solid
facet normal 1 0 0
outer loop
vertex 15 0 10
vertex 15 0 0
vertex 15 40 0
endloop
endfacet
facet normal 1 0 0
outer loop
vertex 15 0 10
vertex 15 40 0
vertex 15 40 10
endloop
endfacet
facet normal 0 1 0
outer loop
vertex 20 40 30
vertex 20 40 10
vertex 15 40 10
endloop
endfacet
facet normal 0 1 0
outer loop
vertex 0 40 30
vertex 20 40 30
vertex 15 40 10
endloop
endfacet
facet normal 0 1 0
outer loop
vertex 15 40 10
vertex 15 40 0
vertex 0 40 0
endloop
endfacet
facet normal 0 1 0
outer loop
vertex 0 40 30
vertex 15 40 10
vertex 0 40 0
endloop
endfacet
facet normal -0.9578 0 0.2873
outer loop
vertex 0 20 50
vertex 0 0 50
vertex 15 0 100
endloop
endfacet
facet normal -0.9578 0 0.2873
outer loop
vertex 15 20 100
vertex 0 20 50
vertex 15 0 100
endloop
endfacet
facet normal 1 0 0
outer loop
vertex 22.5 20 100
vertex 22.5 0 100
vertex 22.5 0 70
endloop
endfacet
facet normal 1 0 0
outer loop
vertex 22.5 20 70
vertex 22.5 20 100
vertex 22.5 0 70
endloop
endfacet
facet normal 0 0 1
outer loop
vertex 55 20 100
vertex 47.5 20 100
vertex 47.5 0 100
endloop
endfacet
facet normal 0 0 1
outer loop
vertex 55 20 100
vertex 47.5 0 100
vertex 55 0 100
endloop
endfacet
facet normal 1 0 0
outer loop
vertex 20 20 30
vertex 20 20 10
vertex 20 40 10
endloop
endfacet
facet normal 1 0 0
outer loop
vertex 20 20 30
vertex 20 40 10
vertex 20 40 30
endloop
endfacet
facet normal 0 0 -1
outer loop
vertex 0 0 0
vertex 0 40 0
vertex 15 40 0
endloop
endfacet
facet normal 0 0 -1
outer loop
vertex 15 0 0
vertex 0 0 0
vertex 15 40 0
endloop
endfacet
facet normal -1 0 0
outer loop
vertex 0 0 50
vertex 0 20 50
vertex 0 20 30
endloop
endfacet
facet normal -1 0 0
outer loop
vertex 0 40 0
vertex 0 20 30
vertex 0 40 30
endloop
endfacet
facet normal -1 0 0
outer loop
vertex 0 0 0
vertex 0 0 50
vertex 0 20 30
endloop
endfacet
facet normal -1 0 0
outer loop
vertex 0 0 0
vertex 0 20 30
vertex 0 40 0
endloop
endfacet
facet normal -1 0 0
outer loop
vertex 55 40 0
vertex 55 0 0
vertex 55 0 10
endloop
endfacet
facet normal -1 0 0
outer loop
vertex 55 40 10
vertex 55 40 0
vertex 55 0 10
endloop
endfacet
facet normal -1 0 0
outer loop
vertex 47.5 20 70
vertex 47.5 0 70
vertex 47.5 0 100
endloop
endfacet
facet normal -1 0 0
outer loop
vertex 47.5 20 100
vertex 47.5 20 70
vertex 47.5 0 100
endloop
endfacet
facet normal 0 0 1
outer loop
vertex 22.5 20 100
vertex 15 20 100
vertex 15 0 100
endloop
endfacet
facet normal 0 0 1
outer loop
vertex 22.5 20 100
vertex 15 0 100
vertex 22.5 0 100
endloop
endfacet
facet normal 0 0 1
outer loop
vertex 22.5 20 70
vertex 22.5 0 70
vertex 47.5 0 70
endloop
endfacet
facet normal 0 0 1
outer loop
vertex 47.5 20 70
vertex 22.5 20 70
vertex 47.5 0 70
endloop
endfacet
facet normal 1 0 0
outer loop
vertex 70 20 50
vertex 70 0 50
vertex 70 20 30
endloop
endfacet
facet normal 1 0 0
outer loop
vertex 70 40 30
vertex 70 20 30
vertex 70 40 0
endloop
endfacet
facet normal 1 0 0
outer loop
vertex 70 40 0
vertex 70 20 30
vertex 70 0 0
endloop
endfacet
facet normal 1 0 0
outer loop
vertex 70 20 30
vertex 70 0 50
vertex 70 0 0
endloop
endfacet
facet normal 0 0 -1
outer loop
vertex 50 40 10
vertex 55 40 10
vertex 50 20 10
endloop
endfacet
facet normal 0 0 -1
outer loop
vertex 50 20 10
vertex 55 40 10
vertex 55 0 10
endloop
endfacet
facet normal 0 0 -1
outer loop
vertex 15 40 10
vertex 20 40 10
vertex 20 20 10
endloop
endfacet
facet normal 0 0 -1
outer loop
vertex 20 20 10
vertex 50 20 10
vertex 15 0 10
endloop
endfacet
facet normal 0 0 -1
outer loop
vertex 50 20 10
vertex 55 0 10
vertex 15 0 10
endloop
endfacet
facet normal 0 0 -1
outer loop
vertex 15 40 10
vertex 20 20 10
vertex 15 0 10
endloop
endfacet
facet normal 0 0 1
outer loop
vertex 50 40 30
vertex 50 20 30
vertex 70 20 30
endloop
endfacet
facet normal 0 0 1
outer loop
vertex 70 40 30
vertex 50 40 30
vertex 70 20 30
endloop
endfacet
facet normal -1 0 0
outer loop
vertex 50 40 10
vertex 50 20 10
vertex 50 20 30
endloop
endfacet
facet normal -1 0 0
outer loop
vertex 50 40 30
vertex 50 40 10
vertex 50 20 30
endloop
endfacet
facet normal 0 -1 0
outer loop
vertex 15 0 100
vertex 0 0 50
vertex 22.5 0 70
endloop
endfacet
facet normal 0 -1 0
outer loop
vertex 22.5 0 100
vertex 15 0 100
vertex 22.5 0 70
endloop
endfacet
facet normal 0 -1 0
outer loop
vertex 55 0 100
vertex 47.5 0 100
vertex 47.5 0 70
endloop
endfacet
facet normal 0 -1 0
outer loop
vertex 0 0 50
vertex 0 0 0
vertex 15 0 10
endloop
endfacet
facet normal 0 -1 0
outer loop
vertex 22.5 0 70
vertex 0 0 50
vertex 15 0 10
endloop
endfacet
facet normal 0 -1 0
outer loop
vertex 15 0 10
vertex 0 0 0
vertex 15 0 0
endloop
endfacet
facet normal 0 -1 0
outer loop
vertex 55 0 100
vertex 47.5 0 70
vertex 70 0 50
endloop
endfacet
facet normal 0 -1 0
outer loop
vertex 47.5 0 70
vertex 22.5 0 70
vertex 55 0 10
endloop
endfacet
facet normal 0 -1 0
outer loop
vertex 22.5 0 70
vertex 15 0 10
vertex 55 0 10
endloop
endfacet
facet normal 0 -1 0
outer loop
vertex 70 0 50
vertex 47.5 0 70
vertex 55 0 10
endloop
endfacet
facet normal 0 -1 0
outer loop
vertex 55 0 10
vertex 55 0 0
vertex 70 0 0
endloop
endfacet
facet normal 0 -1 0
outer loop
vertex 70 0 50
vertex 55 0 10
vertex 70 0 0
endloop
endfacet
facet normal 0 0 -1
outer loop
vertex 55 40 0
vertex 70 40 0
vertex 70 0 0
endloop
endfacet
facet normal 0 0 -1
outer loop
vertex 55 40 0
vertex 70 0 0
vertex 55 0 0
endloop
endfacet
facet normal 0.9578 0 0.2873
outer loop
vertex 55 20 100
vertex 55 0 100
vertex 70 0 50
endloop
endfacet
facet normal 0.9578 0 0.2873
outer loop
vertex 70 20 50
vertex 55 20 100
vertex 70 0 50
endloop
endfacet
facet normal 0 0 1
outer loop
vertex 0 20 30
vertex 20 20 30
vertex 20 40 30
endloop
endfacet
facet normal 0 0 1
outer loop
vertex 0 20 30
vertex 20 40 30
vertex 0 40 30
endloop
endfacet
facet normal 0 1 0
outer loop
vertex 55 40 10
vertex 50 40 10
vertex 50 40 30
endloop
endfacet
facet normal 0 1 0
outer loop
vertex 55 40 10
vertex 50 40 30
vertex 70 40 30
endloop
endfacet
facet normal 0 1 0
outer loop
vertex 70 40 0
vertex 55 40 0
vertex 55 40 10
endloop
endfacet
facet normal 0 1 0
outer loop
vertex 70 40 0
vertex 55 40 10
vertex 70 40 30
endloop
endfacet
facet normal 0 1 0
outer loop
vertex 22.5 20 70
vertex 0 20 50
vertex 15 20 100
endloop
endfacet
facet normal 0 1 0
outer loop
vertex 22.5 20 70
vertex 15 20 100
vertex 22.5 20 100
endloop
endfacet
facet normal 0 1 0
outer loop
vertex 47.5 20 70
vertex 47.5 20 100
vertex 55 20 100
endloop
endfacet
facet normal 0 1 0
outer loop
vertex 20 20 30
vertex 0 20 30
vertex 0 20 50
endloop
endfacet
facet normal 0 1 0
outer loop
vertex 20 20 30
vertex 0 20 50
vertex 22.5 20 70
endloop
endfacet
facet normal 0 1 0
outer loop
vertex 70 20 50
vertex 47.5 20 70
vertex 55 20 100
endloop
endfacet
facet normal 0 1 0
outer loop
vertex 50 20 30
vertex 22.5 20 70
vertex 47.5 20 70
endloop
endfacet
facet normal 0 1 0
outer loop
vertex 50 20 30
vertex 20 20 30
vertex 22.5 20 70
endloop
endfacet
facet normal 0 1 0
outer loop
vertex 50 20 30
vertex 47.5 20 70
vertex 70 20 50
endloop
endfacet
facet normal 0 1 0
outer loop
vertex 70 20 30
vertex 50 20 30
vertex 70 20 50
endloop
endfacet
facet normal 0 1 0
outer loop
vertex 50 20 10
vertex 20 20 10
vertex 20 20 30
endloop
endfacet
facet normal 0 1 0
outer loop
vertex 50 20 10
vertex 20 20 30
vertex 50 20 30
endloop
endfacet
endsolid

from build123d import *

# Parameters (mm, degrees)
BOSS_EXTRUDE1_DEPTH = 20
BOSS_EXTRUDE2_DEPTH = 40
SKETCH1_4_W         = 30
SKETCH1_4_H         = 20
BOSS_EXTRUDE3_DEPTH = 20


with BuildPart() as part:
    # Sketch1 → Boss-Extrude1 (new body)
    with BuildSketch(Plane(origin=(0, 0, 0), x_dir=(1, 0, 0), z_dir=(0, 1, 0))):
        Polygon((0, -30), (0, -50), (15, -100), (22.5, -100), (22.5, -70), (47.5, -70), (47.5, -100), (55, -100), (70, -50), (70, -30), align=None)
    extrude(amount=BOSS_EXTRUDE1_DEPTH)

    # Sketch1<3> → Boss-Extrude2 (add)
    with BuildSketch(Plane(origin=(0, 0, 0), x_dir=(1, 0, 0), z_dir=(0, 1, 0))):
        Polygon((15, 0), (0, 0), (0, -30), (20, -30), (20, -10), (15, -10), align=None)
        Polygon((50, -10), (50, -30), (70, -30), (70, 0), (55, 0), (55, -10), align=None)
    extrude(amount=BOSS_EXTRUDE2_DEPTH)

    # Sketch1<4> → Boss-Extrude3 (add)
    with BuildSketch(Plane(origin=(0, 0, 0), x_dir=(1, 0, 0), z_dir=(0, 1, 0))):
        with Locations((35, -20)):
            Rectangle(SKETCH1_4_W, SKETCH1_4_H)
    extrude(amount=BOSS_EXTRUDE3_DEPTH)


solid = part.part
